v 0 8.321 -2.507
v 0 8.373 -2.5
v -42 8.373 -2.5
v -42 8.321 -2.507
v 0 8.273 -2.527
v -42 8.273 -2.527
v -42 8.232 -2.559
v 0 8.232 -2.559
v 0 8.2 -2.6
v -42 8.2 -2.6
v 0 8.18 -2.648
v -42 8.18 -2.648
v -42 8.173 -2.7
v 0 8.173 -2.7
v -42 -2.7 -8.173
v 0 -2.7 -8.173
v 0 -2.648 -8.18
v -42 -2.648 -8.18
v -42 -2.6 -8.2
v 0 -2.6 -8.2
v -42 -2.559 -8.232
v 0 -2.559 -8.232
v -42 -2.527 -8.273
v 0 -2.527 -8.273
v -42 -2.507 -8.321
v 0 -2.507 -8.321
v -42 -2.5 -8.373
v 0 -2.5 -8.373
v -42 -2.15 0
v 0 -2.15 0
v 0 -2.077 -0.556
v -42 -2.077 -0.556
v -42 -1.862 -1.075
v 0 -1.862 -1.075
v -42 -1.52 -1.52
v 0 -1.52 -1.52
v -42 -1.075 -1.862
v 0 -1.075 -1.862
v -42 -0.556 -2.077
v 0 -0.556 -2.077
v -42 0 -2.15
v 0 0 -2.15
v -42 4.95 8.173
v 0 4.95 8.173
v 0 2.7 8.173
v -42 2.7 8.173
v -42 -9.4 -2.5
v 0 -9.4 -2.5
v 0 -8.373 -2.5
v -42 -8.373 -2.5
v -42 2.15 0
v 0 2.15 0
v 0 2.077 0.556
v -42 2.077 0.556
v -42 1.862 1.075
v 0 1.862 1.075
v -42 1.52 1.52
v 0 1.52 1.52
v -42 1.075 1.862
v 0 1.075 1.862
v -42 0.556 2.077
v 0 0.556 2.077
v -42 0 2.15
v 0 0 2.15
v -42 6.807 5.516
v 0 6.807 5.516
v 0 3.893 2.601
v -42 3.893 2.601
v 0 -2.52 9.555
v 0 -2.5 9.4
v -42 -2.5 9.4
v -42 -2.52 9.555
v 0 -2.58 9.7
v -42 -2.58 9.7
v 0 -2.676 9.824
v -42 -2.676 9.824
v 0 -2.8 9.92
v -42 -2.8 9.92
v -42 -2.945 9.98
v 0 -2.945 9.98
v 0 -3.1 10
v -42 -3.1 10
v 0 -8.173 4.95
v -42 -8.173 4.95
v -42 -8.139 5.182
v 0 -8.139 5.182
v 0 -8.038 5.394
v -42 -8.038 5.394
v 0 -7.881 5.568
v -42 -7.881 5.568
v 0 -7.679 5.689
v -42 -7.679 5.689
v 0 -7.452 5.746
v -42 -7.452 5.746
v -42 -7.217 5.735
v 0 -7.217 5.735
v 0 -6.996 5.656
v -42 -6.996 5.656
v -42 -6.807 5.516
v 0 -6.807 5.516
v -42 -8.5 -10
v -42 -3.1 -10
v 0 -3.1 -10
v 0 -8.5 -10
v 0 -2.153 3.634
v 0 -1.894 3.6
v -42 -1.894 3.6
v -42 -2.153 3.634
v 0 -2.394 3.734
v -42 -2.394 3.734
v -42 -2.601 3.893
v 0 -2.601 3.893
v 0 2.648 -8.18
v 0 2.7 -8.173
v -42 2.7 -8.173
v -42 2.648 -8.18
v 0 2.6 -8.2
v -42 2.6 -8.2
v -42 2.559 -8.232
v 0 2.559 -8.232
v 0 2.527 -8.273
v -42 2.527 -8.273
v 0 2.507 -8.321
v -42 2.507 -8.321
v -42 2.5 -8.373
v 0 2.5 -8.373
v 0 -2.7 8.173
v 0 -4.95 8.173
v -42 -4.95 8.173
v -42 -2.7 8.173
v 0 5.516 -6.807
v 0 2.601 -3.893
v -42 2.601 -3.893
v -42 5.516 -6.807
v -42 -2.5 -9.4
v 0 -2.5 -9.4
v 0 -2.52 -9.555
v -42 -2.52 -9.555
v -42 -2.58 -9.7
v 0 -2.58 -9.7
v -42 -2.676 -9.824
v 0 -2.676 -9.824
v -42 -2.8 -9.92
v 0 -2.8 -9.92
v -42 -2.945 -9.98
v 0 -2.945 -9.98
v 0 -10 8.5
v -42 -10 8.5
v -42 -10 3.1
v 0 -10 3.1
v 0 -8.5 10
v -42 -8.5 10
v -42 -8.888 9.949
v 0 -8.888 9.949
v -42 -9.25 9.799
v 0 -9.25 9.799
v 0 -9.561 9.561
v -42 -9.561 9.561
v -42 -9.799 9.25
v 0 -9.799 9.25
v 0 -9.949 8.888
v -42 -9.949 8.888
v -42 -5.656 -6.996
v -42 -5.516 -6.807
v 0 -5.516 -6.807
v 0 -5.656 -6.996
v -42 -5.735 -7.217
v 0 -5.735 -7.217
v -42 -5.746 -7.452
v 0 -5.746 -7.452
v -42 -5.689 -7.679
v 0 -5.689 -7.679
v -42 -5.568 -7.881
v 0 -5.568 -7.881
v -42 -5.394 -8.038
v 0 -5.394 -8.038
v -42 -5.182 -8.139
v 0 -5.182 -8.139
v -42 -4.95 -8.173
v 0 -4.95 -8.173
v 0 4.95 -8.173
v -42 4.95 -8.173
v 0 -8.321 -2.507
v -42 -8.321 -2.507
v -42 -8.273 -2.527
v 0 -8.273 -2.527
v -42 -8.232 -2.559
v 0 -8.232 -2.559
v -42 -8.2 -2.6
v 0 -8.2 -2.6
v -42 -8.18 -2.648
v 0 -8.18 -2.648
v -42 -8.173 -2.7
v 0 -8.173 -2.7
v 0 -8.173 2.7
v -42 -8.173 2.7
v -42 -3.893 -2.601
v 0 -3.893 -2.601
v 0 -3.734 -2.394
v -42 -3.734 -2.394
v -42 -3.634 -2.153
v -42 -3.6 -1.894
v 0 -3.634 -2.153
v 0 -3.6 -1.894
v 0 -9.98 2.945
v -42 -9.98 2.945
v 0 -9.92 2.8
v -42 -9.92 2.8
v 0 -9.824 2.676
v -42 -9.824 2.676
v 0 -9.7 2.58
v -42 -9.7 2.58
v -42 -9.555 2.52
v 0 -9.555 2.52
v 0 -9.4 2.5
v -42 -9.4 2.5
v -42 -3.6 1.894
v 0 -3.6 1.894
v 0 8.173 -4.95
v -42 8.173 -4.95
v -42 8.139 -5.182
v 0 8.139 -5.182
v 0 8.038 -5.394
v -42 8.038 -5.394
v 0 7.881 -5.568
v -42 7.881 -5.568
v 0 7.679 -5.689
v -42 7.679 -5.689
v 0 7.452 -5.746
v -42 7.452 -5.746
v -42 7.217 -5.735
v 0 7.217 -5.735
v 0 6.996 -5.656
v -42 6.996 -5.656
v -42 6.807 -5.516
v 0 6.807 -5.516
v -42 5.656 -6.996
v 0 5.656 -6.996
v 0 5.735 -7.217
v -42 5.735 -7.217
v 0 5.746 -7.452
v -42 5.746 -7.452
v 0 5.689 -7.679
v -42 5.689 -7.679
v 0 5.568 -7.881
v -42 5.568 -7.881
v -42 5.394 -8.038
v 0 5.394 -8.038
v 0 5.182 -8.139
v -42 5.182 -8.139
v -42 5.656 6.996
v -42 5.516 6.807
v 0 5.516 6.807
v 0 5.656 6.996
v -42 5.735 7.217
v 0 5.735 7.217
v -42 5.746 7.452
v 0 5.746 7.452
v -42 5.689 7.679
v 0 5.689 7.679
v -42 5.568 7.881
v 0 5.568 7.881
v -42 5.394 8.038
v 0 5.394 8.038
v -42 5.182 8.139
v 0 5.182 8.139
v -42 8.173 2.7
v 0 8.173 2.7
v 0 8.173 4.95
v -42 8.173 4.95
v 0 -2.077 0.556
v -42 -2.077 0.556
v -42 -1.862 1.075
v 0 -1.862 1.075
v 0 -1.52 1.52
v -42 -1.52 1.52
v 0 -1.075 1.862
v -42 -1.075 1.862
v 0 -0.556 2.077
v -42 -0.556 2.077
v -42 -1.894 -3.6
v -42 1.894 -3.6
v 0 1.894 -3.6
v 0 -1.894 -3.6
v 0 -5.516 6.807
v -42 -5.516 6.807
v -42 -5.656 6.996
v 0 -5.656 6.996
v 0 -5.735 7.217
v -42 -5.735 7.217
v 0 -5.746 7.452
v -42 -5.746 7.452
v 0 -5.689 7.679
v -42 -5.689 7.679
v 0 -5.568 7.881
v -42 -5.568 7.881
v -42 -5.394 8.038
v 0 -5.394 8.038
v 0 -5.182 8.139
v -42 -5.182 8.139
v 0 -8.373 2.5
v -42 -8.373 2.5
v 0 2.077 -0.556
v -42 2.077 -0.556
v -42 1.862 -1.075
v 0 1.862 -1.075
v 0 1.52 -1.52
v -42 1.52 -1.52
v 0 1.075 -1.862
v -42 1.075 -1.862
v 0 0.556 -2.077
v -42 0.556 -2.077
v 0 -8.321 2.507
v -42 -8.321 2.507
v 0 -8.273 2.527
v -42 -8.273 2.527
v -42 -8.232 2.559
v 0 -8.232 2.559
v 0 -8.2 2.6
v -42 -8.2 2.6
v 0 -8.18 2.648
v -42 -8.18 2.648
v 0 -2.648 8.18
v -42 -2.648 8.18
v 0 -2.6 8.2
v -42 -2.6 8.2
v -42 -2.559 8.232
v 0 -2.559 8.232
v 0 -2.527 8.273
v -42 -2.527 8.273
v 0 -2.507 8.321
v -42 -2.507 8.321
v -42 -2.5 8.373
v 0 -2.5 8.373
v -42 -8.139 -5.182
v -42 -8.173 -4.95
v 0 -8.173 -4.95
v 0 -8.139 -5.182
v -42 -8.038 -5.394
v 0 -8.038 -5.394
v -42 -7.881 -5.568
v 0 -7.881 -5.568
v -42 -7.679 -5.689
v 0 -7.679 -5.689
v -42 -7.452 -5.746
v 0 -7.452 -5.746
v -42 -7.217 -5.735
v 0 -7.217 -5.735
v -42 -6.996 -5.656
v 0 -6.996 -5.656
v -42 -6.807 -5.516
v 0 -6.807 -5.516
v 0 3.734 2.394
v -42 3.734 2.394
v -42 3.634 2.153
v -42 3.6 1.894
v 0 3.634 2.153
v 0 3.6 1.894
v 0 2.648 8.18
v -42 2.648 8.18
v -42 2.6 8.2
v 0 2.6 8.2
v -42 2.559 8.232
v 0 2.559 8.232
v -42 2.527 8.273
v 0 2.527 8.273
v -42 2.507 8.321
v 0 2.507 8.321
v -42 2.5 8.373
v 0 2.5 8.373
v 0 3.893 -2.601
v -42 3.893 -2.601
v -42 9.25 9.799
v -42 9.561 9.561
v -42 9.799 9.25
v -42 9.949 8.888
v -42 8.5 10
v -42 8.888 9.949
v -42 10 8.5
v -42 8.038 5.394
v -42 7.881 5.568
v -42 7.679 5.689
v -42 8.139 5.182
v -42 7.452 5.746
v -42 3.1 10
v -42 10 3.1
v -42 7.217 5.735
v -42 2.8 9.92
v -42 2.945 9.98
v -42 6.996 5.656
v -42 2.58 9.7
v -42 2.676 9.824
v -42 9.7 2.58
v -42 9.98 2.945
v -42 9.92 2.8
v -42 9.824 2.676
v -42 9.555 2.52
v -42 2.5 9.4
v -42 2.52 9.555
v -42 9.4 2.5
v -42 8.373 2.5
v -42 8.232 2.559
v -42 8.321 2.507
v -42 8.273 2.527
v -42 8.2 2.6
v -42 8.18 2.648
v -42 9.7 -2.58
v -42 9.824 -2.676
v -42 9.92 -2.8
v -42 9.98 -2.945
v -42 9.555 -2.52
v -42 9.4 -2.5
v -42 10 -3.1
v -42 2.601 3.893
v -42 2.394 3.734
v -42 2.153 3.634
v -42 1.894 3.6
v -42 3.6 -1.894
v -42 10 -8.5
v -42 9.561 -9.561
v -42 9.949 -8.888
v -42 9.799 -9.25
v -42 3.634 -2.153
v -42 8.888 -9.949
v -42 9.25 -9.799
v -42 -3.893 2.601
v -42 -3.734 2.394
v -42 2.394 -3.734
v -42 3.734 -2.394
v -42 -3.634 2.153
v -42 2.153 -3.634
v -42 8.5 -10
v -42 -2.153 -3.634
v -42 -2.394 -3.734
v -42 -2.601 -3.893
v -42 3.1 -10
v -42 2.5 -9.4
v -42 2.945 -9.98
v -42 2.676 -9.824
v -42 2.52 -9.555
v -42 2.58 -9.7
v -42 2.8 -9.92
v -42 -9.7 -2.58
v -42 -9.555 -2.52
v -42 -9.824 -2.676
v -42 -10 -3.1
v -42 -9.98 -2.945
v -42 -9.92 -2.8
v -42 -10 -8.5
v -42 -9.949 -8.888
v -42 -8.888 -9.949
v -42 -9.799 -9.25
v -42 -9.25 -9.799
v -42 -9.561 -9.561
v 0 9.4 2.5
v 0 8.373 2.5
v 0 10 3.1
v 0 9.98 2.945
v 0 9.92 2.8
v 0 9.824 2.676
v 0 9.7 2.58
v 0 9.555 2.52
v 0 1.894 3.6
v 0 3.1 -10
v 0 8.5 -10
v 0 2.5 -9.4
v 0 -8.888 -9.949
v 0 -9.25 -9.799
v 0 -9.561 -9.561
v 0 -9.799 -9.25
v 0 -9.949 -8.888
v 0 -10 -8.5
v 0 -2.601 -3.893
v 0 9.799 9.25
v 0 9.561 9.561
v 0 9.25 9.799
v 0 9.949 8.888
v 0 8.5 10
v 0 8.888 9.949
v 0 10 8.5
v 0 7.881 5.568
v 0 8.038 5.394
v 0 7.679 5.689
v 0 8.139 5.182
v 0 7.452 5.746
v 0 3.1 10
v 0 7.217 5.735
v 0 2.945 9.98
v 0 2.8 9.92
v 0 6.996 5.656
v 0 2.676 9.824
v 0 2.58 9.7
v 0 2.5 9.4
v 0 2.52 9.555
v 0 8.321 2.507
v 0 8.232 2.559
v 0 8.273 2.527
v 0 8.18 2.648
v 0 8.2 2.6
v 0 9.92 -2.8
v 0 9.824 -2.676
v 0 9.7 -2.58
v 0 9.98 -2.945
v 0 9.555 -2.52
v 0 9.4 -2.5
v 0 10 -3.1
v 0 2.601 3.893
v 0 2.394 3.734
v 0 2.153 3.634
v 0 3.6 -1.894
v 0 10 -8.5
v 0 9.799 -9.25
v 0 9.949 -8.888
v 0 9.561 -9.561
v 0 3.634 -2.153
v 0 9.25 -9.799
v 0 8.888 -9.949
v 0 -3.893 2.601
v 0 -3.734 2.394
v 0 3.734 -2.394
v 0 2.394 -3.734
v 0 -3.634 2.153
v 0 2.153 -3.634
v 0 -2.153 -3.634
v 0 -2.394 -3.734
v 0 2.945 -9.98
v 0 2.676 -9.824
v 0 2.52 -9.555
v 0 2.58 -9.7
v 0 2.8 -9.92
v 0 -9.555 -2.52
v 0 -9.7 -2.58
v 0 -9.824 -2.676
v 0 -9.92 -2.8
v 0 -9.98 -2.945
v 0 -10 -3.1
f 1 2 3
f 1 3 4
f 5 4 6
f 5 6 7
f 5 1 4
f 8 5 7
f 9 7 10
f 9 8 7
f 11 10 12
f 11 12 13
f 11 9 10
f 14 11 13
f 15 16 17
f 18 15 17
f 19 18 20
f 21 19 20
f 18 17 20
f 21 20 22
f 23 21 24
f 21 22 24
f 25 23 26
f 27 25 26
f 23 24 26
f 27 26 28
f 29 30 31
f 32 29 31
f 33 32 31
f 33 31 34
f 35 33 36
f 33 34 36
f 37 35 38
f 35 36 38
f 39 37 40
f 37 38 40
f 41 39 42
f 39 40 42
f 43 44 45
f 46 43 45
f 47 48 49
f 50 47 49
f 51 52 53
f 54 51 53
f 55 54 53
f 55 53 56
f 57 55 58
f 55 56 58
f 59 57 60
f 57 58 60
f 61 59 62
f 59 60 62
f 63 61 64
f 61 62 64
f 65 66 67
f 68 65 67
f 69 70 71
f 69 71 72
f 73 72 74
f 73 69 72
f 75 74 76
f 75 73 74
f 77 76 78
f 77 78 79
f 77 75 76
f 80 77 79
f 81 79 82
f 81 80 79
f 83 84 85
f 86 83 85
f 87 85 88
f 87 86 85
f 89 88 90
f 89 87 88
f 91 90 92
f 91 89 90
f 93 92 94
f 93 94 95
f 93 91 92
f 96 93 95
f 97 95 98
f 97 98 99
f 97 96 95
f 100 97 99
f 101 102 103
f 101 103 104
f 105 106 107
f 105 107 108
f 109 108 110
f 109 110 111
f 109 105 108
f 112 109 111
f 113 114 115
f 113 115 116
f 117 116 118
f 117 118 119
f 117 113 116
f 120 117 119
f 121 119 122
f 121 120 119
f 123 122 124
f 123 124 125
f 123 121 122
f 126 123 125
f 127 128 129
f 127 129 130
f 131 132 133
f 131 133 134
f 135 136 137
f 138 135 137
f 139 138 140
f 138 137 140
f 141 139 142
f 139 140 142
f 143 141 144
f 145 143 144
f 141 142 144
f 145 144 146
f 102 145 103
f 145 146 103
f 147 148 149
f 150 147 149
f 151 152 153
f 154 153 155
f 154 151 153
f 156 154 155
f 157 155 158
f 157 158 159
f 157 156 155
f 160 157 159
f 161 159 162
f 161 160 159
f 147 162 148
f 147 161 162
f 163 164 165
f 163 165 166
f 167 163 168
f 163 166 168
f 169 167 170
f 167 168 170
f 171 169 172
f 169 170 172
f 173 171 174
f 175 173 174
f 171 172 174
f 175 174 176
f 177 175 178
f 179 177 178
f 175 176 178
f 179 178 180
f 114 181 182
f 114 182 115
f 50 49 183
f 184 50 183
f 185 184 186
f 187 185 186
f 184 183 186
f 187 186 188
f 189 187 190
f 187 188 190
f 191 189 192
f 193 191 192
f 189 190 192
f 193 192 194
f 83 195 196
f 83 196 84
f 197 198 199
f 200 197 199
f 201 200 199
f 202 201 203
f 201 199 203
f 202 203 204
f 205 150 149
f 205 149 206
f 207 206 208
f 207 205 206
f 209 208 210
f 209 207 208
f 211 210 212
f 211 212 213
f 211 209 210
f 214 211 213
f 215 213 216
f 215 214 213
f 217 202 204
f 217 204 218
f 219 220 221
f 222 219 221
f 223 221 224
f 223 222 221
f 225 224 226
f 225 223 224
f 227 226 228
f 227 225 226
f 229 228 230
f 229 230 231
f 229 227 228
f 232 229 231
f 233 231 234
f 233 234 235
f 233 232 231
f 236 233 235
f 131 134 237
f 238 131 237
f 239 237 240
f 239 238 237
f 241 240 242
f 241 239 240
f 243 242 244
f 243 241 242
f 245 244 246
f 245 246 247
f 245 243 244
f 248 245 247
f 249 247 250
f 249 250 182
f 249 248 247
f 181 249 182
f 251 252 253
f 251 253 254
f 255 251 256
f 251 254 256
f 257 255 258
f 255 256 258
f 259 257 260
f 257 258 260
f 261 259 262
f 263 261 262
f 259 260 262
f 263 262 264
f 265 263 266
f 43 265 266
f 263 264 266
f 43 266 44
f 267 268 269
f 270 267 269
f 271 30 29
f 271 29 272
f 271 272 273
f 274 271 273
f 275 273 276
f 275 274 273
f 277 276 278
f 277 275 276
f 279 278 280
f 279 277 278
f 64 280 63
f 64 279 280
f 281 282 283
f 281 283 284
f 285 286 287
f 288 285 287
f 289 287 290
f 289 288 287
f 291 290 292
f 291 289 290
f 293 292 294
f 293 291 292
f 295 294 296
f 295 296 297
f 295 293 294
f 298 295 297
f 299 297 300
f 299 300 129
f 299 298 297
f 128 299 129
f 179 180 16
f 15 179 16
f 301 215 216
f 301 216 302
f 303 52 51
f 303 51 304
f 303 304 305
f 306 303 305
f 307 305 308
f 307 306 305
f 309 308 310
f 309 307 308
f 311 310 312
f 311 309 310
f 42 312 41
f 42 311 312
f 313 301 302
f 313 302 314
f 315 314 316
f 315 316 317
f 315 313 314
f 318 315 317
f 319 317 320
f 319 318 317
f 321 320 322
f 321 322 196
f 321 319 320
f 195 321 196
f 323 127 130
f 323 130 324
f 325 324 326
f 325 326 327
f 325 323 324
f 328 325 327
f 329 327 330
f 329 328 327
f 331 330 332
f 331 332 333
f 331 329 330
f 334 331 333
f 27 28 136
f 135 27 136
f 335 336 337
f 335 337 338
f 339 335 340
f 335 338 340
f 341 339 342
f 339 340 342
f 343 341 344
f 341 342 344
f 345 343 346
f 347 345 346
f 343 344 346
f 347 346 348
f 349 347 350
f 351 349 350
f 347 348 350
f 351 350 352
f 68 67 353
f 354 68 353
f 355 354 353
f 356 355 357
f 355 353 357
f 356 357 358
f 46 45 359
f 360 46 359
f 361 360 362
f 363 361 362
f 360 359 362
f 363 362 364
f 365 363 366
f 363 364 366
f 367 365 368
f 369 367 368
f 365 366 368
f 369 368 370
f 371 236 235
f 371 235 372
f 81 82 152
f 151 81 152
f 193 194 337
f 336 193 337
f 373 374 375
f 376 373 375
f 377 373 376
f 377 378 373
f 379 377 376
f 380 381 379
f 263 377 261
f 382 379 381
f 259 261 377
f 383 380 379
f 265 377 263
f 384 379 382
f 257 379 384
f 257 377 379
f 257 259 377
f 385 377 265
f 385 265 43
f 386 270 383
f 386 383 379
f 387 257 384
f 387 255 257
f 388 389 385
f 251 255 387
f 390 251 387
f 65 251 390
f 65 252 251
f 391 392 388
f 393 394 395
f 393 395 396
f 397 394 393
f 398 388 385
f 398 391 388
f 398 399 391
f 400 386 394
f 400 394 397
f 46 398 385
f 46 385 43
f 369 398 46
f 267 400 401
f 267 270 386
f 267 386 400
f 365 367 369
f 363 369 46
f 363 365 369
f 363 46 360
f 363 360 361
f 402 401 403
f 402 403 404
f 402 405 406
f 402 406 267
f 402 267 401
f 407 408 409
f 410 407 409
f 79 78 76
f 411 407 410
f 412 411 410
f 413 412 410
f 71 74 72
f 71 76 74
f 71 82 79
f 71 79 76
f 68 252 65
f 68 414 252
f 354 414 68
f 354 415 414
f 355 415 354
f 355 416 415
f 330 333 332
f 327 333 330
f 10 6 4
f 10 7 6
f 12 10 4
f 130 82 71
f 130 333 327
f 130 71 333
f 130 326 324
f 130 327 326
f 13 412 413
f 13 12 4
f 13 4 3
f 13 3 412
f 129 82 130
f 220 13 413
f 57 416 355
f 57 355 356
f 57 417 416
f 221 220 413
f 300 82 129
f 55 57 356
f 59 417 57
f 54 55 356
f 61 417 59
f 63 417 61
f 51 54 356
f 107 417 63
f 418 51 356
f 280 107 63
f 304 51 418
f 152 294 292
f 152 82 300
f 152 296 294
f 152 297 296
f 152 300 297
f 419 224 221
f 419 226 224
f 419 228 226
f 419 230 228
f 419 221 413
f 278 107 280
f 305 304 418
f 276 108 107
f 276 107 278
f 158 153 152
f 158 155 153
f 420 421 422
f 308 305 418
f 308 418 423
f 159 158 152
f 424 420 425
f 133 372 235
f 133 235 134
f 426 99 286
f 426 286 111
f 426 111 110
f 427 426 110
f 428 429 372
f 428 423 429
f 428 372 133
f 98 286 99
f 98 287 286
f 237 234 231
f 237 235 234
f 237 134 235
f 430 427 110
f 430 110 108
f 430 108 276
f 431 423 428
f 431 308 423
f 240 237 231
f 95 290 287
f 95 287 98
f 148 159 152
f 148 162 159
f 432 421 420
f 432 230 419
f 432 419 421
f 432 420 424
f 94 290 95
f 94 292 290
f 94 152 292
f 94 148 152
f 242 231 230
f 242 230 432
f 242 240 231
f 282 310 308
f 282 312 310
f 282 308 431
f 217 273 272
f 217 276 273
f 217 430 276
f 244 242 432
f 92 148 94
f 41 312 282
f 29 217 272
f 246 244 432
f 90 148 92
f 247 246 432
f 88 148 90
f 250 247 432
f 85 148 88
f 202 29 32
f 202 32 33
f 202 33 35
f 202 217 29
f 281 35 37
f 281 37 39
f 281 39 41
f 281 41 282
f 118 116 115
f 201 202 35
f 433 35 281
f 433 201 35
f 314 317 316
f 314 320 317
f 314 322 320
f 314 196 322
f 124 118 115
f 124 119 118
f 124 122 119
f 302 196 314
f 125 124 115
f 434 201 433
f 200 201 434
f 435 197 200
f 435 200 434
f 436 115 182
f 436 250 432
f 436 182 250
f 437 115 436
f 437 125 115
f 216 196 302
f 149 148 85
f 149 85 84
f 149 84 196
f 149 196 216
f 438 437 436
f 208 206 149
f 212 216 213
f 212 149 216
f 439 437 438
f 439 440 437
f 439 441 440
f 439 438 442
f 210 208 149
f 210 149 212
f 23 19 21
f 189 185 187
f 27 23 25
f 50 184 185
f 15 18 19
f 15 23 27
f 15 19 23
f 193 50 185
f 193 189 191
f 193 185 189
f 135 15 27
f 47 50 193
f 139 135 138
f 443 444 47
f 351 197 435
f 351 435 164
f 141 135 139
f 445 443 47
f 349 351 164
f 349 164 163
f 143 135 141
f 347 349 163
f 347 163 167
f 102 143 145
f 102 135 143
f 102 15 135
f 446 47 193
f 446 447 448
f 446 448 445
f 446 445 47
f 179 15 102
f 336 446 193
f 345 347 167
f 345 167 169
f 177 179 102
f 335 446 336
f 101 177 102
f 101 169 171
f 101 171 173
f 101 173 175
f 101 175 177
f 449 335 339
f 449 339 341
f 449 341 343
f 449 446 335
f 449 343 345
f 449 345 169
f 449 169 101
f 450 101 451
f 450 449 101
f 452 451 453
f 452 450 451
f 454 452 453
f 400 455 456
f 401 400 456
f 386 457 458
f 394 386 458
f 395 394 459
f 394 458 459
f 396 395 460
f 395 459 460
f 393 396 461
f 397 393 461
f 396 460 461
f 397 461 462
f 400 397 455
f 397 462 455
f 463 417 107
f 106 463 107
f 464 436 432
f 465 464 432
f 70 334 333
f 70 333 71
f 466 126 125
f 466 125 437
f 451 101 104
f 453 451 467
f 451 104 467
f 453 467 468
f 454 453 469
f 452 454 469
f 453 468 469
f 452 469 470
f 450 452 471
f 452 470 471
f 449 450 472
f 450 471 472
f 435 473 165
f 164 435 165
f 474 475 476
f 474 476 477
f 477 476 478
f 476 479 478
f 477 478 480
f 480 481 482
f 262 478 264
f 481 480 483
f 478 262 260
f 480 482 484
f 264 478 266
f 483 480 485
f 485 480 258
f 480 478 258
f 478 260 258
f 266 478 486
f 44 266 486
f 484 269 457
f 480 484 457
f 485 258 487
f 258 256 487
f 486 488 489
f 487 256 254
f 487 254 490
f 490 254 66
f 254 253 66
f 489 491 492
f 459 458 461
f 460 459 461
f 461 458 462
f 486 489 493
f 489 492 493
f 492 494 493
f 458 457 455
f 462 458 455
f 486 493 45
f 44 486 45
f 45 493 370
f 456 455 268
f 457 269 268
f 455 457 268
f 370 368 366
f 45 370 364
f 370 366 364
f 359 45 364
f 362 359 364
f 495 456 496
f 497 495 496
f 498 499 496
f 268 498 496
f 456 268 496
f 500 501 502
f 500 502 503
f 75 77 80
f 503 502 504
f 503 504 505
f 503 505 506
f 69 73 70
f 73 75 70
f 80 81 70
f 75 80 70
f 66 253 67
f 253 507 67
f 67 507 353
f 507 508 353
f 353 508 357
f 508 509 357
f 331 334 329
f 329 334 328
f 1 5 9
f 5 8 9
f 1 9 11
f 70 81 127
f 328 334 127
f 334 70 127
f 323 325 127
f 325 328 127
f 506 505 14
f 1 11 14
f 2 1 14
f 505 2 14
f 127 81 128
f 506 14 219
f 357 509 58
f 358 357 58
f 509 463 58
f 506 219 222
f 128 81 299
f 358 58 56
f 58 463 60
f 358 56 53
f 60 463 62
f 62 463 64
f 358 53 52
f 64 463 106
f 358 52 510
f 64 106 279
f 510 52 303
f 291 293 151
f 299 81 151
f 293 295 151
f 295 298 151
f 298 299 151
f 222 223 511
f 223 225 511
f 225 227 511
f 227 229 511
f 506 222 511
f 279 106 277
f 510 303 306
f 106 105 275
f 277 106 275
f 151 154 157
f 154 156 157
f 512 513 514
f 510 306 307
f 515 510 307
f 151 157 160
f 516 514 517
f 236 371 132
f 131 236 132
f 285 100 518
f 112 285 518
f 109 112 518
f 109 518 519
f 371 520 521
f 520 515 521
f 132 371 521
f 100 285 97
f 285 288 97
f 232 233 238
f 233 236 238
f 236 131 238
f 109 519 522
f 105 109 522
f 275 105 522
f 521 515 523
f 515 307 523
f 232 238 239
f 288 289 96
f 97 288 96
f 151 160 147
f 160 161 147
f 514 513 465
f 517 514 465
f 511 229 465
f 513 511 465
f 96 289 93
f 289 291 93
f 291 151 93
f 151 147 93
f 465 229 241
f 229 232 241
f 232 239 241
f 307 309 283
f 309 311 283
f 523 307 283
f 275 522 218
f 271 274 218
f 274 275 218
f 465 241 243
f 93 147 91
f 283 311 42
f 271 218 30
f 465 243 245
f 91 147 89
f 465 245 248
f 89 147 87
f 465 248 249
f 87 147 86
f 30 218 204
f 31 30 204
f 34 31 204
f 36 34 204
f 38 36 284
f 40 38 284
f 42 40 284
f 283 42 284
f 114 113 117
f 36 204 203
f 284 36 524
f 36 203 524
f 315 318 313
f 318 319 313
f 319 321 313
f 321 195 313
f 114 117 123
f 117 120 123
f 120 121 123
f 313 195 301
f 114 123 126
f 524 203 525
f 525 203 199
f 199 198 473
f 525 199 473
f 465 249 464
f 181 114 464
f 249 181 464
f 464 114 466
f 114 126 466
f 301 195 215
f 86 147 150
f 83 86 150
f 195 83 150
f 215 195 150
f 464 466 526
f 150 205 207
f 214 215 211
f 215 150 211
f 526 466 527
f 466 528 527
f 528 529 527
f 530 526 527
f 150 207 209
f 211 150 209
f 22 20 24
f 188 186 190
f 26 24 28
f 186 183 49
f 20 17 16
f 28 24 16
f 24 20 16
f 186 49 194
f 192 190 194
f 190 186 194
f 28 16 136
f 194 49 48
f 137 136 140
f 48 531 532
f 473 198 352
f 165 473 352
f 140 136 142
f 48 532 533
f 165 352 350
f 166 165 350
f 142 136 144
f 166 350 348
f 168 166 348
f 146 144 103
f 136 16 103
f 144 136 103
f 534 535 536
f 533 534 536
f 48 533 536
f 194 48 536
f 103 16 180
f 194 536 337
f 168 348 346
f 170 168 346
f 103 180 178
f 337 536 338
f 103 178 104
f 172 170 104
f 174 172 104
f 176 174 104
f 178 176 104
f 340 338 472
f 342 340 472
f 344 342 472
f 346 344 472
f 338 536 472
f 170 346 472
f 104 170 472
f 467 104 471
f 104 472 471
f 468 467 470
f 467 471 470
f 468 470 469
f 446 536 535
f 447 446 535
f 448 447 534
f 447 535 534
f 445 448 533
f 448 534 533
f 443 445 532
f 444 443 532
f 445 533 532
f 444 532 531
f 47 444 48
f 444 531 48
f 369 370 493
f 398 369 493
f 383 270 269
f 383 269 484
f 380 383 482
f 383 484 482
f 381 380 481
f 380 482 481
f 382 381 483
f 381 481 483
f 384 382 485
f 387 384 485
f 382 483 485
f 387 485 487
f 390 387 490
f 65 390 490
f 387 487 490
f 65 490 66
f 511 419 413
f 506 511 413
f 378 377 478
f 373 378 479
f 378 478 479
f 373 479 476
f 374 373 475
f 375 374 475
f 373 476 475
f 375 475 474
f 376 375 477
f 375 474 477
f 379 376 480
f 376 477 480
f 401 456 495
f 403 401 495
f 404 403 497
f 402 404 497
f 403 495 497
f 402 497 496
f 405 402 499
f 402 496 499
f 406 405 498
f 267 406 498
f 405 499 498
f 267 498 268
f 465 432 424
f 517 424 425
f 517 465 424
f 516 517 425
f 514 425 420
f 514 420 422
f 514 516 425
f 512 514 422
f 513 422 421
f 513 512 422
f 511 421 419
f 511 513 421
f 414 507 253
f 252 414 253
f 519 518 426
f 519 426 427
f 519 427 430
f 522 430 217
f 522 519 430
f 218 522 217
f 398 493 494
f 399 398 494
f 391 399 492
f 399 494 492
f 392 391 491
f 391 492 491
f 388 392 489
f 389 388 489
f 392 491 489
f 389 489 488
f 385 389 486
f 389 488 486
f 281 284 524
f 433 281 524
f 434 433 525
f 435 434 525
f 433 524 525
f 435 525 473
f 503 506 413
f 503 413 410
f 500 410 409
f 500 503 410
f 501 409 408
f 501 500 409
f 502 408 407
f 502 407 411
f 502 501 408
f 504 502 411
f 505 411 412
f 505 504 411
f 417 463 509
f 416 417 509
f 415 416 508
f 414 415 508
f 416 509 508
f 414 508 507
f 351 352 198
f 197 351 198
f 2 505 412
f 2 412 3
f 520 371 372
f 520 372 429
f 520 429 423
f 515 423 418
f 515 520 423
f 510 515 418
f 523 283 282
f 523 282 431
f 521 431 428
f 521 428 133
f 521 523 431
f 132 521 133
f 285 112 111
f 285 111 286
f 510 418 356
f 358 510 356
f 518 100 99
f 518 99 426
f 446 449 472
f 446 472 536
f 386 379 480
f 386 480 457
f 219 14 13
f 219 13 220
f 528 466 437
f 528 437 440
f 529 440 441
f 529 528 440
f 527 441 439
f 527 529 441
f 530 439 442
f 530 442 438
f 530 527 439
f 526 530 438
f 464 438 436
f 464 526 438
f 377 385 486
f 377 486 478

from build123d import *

# Parameters (mm, degrees)
BOSS_EXTRUDE1_DEPTH = 42


with BuildPart() as part:
    # Sketch3 → Boss-Extrude1 (new body)
    with BuildSketch(Plane(origin=(0, 0, 0), x_dir=(0, 0, -1), z_dir=(1, 0, 0))):
        with BuildLine():
            Line((-5.515685425, 6.807463915), (-2.601114729, 3.892893219))
            ThreePointArc((-2.601114729, 3.892893219), (-2.27669138, 3.676120467), (-1.894007948, 3.6))
            Line((-1.894007948, 3.6), (0, 3.6))
            Line((0, 3.6), (0, 2.15))
            ThreePointArc((0, 2.15), (-1.52027958, 1.52027958), (-2.15, 0))
            Line((-2.15, 0), (-3.6, 0))
            Line((-3.6, 0), (-3.6, 1.894007948))
            ThreePointArc((-3.6, 1.894007948), (-3.676120467, 2.27669138), (-3.892893219, 2.601114729))
            Line((-3.892893219, 2.601114729), (-6.807463915, 5.515685425))
            ThreePointArc((-6.807463915, 5.515685425), (-7.679296086, 5.689103626), (-8.17314934, 4.95))
            Line((-8.17314934, 4.95), (-8.17314934, 2.7))
            ThreePointArc((-8.17314934, 2.7), (-8.231727984, 2.558578644), (-8.37314934, 2.5))
            Line((-8.37314934, 2.5), (-9.4, 2.5))
            ThreePointArc((-9.4, 2.5), (-9.824264069, 2.675735931), (-10, 3.1))
            Line((-10, 3.1), (-10, 8.5))
            ThreePointArc((-10, 8.5), (-9.560660172, 9.560660172), (-8.5, 10))
            Line((-8.5, 10), (-3.1, 10))
            ThreePointArc((-3.1, 10), (-2.675735931, 9.824264069), (-2.5, 9.4))
            Line((-2.5, 9.4), (-2.5, 8.37314934))
            ThreePointArc((-2.5, 8.37314934), (-2.558578644, 8.231727984), (-2.7, 8.17314934))
            Line((-2.7, 8.17314934), (-4.95, 8.17314934))
            ThreePointArc((-4.95, 8.17314934), (-5.689103626, 7.679296086), (-5.515685425, 6.807463915))
        make_face()
    extrude(amount=-BOSS_EXTRUDE1_DEPTH)

    # Mirror1: part across plane


with BuildPart() as part_1:
    add(part.part)
    add(part.part.mirror(Plane.ZX))

    # Mirror2: part across plane


with BuildPart() as part_2:
    add(part_1.part)
    add(part_1.part.mirror(Plane.XY))


solid = part_2.part
